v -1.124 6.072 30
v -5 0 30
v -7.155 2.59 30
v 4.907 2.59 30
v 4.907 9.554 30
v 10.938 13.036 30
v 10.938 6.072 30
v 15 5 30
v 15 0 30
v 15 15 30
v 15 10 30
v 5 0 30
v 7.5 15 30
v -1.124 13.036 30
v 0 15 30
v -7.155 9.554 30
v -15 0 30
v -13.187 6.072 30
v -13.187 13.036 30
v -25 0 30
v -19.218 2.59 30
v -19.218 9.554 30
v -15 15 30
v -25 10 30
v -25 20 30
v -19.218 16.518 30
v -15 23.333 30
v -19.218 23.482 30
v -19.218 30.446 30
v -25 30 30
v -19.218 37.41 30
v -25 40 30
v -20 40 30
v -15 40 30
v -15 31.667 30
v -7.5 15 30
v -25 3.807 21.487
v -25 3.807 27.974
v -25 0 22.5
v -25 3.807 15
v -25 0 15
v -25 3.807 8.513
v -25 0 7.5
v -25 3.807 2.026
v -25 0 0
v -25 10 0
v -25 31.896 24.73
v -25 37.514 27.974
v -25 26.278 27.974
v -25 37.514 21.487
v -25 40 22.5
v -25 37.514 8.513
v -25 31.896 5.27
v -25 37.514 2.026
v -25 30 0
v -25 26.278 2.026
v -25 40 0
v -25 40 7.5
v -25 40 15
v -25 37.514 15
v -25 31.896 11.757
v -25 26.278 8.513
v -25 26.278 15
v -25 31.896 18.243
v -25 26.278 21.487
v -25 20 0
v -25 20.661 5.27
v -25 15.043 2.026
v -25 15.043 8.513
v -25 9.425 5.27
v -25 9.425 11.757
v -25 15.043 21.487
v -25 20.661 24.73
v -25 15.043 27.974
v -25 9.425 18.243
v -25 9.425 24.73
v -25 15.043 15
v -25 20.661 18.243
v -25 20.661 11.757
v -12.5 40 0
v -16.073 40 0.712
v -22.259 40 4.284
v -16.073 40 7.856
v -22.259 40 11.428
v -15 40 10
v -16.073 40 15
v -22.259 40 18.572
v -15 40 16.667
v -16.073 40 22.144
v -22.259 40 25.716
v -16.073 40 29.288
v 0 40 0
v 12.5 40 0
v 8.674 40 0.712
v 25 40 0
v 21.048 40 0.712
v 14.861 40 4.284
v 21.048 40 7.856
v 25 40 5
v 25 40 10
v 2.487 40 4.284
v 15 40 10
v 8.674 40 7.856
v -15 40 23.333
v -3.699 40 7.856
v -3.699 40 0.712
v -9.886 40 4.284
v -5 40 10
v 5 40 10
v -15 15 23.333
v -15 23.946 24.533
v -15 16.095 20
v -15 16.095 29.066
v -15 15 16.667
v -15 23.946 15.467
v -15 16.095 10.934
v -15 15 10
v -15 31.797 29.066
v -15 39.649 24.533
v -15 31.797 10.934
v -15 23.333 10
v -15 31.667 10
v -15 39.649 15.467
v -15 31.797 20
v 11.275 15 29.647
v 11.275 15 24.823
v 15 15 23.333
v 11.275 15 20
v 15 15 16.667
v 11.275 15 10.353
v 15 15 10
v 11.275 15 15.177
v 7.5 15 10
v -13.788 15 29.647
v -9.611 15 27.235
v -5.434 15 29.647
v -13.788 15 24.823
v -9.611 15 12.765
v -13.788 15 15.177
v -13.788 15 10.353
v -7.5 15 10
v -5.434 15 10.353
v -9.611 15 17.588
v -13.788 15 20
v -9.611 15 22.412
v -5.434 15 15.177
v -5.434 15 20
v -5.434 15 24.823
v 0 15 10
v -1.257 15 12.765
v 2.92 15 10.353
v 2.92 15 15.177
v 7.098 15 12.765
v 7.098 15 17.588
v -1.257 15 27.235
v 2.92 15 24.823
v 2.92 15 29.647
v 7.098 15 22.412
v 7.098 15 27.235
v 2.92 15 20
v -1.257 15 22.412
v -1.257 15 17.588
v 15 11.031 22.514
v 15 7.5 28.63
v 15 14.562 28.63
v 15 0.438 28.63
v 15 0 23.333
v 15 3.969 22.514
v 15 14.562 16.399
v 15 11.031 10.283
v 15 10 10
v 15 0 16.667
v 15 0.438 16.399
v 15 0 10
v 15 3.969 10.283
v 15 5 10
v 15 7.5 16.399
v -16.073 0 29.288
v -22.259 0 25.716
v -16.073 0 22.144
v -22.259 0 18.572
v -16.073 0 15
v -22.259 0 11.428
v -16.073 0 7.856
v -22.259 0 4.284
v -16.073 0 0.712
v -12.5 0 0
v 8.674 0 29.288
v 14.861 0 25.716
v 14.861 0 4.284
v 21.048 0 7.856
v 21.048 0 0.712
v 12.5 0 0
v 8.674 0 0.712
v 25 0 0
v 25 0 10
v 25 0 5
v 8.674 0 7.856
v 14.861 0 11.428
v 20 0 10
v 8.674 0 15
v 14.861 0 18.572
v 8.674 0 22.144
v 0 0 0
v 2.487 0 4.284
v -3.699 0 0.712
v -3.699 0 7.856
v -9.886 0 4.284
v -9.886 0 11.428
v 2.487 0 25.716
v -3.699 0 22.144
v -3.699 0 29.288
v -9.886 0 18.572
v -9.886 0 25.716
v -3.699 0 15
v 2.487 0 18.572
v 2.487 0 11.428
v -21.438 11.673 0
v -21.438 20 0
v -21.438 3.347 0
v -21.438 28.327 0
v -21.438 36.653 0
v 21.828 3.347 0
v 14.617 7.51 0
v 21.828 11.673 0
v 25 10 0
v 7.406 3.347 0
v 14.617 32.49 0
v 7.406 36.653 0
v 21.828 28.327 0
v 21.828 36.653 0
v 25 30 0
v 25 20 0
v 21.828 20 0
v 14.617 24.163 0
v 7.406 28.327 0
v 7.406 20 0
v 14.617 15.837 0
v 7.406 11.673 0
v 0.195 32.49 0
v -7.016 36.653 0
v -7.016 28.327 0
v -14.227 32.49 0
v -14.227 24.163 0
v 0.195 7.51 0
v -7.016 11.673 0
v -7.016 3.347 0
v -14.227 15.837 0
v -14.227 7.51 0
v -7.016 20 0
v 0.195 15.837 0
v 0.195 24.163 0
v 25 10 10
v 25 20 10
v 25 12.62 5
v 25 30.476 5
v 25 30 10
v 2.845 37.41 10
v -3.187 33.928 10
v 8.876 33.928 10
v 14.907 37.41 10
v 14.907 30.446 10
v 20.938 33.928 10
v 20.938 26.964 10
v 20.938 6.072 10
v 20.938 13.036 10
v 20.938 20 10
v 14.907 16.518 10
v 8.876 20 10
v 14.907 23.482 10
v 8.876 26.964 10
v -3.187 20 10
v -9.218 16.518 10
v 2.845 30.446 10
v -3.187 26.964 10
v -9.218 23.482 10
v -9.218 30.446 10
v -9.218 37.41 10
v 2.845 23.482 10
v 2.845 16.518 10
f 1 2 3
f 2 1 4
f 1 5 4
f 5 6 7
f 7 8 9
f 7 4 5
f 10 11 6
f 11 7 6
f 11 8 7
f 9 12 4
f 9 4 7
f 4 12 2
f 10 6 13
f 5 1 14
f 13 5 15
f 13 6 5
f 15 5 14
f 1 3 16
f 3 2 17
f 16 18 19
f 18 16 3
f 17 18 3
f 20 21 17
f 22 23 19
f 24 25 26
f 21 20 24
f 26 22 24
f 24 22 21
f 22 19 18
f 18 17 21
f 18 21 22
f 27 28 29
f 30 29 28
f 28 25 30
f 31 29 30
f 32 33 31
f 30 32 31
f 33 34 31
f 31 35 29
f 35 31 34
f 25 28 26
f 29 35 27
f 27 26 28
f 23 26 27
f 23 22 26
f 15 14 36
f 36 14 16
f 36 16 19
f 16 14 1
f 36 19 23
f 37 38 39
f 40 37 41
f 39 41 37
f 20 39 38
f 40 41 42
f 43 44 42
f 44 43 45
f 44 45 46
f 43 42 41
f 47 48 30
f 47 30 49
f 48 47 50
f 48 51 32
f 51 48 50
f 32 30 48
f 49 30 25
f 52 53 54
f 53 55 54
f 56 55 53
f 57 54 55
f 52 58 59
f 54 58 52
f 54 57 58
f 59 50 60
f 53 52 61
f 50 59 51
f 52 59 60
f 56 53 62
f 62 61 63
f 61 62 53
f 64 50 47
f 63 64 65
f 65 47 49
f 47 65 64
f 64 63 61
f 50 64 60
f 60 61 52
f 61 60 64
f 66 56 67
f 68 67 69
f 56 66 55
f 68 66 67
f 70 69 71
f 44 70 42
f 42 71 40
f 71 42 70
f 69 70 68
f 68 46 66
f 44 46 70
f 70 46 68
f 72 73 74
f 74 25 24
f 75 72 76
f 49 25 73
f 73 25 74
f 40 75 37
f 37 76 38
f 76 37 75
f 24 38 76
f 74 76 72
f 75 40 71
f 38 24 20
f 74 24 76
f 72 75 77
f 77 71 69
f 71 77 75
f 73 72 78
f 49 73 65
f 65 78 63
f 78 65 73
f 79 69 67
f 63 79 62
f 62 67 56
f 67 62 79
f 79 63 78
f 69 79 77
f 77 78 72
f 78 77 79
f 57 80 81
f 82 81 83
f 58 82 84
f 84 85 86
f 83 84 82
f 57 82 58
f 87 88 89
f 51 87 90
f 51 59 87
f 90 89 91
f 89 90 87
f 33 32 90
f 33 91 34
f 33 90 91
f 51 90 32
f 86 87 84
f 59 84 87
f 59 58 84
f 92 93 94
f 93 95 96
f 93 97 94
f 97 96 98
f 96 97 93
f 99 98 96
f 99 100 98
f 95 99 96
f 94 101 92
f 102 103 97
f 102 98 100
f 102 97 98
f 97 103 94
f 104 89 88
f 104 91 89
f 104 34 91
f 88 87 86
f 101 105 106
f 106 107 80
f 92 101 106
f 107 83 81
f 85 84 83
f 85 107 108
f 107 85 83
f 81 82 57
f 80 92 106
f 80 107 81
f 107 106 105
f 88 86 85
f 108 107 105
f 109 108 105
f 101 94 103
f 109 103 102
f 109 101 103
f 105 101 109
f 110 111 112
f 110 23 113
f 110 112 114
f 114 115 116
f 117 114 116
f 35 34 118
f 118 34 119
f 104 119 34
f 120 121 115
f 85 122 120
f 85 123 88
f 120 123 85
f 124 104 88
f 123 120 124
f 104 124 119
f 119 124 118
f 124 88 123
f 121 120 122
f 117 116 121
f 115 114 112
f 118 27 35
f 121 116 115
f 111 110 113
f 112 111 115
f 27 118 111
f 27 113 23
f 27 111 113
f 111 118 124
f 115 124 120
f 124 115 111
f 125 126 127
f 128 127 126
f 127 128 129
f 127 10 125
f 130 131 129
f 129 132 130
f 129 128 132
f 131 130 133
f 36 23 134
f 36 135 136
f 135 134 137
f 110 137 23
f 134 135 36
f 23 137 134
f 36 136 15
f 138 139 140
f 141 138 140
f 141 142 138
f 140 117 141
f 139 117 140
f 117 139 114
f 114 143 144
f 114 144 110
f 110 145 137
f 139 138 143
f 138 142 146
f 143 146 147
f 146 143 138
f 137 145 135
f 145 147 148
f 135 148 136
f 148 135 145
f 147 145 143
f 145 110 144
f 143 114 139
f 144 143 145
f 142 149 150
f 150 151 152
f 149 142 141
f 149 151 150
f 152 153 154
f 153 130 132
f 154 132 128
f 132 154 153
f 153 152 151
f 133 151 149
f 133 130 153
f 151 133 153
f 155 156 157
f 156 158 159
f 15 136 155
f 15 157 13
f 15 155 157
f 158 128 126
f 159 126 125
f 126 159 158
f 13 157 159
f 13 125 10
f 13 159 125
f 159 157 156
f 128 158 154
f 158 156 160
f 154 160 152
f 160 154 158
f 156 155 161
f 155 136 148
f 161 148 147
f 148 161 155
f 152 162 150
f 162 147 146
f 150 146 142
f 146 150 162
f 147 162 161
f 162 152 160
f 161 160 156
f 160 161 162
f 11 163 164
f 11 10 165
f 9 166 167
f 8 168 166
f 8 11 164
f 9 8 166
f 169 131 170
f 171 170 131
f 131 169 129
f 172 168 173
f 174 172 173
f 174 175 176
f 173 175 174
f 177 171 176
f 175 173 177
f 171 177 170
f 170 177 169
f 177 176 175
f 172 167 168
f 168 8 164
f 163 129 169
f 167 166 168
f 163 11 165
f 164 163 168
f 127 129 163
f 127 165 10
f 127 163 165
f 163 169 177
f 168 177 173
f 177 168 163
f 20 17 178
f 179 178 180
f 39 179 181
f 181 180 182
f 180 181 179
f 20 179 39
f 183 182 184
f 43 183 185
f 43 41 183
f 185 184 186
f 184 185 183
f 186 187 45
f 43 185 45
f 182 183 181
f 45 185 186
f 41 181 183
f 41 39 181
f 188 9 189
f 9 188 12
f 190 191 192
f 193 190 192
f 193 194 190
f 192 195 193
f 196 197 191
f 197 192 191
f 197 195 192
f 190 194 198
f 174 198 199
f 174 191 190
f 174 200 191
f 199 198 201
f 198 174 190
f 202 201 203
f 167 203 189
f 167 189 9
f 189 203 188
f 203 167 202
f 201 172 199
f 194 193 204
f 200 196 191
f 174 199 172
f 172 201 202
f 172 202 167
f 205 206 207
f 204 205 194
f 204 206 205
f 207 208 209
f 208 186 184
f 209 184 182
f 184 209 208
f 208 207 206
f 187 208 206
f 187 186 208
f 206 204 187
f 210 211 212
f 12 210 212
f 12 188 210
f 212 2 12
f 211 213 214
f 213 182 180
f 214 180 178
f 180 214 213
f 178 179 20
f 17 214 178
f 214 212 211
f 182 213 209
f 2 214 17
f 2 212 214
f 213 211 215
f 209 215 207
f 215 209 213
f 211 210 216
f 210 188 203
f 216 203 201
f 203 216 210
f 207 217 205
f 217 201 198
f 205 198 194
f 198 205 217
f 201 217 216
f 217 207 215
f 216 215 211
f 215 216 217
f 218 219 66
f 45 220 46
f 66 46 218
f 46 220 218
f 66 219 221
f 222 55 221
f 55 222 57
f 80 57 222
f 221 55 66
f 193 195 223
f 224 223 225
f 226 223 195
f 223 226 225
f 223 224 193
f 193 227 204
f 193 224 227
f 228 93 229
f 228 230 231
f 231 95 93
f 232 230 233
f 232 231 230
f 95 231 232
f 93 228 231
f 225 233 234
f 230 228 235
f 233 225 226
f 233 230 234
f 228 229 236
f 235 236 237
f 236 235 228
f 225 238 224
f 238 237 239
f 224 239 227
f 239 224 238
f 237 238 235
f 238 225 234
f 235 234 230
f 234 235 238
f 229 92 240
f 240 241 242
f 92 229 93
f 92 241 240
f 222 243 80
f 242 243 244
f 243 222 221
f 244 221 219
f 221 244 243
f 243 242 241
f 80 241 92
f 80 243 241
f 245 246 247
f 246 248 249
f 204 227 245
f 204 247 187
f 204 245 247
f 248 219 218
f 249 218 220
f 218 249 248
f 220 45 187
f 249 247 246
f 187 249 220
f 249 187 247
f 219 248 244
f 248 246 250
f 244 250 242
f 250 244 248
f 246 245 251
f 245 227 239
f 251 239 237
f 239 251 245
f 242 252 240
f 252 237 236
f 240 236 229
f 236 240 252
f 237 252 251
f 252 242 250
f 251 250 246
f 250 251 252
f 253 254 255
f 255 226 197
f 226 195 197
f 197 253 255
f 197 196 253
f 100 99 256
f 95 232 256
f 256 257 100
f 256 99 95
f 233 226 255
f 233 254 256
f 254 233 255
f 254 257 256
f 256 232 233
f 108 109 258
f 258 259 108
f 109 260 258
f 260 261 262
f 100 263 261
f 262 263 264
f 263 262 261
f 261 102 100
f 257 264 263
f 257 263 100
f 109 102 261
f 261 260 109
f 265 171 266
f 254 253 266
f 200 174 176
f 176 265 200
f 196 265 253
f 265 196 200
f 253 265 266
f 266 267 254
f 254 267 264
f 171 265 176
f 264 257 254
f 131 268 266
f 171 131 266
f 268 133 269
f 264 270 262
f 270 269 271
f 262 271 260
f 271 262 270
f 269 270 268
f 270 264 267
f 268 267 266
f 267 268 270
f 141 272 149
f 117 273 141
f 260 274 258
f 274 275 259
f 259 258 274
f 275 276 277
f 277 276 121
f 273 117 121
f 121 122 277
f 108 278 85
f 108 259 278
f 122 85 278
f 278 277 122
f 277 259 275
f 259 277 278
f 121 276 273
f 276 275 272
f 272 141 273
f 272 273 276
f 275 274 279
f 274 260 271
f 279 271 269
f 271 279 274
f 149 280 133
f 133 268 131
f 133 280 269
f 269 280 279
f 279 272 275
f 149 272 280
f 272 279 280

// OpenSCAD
// CSG file generated from FreeCAD 0.20.2
group() {
 group(){
polyhedron ( points = [[-25.000000,0.000000,30.000000],[-25.000000,40.000000,30.000000],[-15.000000,40.000000,30.000000],[-15.000000,15.000000,30.000000],[15.000000,15.000000,30.000000],[15.000000,0.000000,30.000000],[-25.000000,40.000000,-0.000000],[-25.000000,0.000000,-0.000000],[25.000000,40.000000,-0.000000],[25.000000,40.000000,10.000000],[-15.000000,40.000000,10.000000],[-15.000000,15.000000,10.000000],[15.000000,15.000000,10.000000],[15.000000,0.000000,10.000000],[25.000000,-0.000000,10.000000],[25.000000,-0.000000,0.000000],[-25.000000,10.000000,30.000000],[-25.000000,20.000000,30.000000],[-25.000000,30.000000,30.000000],[-20.000000,40.000000,30.000000],[-15.000000,23.333334,30.000000],[-15.000000,31.666666,30.000000],[7.500000,15.000000,30.000000],[-0.000000,15.000000,30.000000],[-7.500000,15.000000,30.000000],[15.000000,5.000000,30.000000],[15.000000,10.000000,30.000000],[-15.000000,0.000000,30.000000],[-5.000000,-0.000000,30.000000],[5.000000,-0.000000,30.000000],[-25.000000,40.000000,22.500000],[-25.000000,40.000000,15.000000],[-25.000000,40.000000,7.500000],[-25.000000,30.000000,0.000000],[-25.000000,20.000000,0.000000],[-25.000000,10.000000,0.000000],[-25.000000,-0.000000,7.500000],[-25.000000,-0.000000,15.000000],[-25.000000,-0.000000,22.500000],[-12.500000,40.000000,-0.000000],[-0.000000,40.000000,-0.000000],[12.500000,40.000000,-0.000000],[25.000000,40.000000,5.000000],[15.000000,40.000000,10.000000],[5.000000,40.000000,10.000000],[-5.000000,40.000000,10.000000],[-15.000000,40.000000,23.333334],[-15.000000,40.000000,16.666666],[-15.000000,31.666666,10.000000],[-15.000000,23.333334,10.000000],[-15.000000,15.000000,16.666666],[-15.000000,15.000000,23.333334],[15.000000,15.000000,23.333334],[15.000000,15.000000,16.666666],[7.500000,15.000000,10.000000],[0.000000,15.000000,10.000000],[-7.500000,15.000000,10.000000],[15.000000,10.000000,10.000000],[15.000000,5.000000,10.000000],[15.000000,0.000000,16.666666],[15.000000,-0.000000,23.333334],[20.000000,-0.000000,10.000000],[25.000000,0.000000,5.000000],[-12.500000,0.000000,-0.000000],[-0.000000,-0.000000,0.000000],[12.500000,-0.000000,0.000000],[25.000000,30.000000,-0.000000],[25.000000,20.000000,-0.000000],[25.000000,10.000000,-0.000000],[25.000000,30.000000,10.000000],[25.000000,20.000000,10.000000],[25.000000,10.000000,10.000000],[-1.124356,6.071796,30.000000],[10.937822,13.035898,30.000000],[-13.186534,13.035898,30.000000],[-7.155445,2.589746,30.000000],[4.906733,9.553847,30.000000],[4.906733,2.589746,30.000000],[10.937822,6.071796,30.000000],[-1.124356,13.035898,30.000000],[-7.155445,9.553847,30.000000],[-13.186534,6.071796,30.000000],[-19.217623,2.589746,30.000000],[-19.217623,9.553847,30.000000],[-19.217623,16.517950,30.000000],[-19.217623,23.482052,30.000000],[-19.217623,30.446154,30.000000],[-19.217623,37.410255,30.000000],[-25.000000,3.806898,15.000000],[-25.000000,26.278448,2.026044],[-25.000000,26.278448,27.973957],[-25.000000,3.806898,27.973957],[-25.000000,3.806898,2.026044],[-25.000000,37.514225,21.486979],[-25.000000,37.514225,8.513022],[-25.000000,26.278448,15.000000],[-25.000000,15.042673,8.513022],[-25.000000,15.042673,21.486979],[-25.000000,3.806898,21.486979],[-25.000000,3.806898,8.513022],[-25.000000,31.896338,24.730467],[-25.000000,37.514225,27.973957],[-25.000000,31.896338,5.269533],[-25.000000,37.514225,2.026044],[-25.000000,37.514225,15.000000],[-25.000000,31.896338,11.756511],[-25.000000,26.278448,8.513022],[-25.000000,31.896338,18.243488],[-25.000000,26.278448,21.486979],[-25.000000,20.660561,5.269533],[-25.000000,15.042673,2.026044],[-25.000000,9.424786,5.269533],[-25.000000,9.424786,11.756511],[-25.000000,20.660561,24.730467],[-25.000000,15.042673,27.973957],[-25.000000,9.424786,18.243488],[-25.000000,9.424786,24.730467],[-25.000000,15.042673,15.000000],[-25.000000,20.660561,18.243488],[-25.000000,20.660561,11.756511],[-16.072701,40.000000,15.000000],[8.674176,40.000000,0.712384],[-16.072701,40.000000,0.712384],[-16.072701,40.000000,29.287615],[21.047615,40.000000,7.856192],[-3.699262,40.000000,7.856192],[-22.259418,40.000000,4.284288],[-22.259418,40.000000,11.428096],[-16.072701,40.000000,7.856192],[-22.259418,40.000000,18.571903],[-22.259418,40.000000,25.715712],[-16.072701,40.000000,22.143808],[14.860895,40.000000,4.284288],[21.047615,40.000000,0.712384],[8.674176,40.000000,7.856192],[2.487457,40.000000,4.284288],[-3.699262,40.000000,0.712384],[-9.885982,40.000000,4.284288],[-15.000000,31.797277,10.934029],[-15.000000,31.797277,29.065971],[-15.000000,16.094553,20.000000],[-15.000000,16.094553,29.065971],[-15.000000,16.094553,10.934029],[-15.000000,39.648640,24.532986],[-15.000000,39.648640,15.467014],[-15.000000,31.797277,20.000000],[-15.000000,23.945915,15.467014],[-15.000000,23.945915,24.532986],[-5.434068,15.000000,10.353176],[-5.434068,15.000000,29.646824],[11.274721,15.000000,20.000000],[11.274721,15.000000,29.646824],[11.274721,15.000000,10.353176],[-13.788463,15.000000,24.823412],[-13.788463,15.000000,15.176588],[-5.434068,15.000000,20.000000],[2.920326,15.000000,15.176588],[2.920326,15.000000,24.823412],[11.274721,15.000000,24.823412],[11.274721,15.000000,15.176588],[-9.611265,15.000000,27.235117],[-13.788463,15.000000,29.646824],[-9.611265,15.000000,12.764882],[-13.788463,15.000000,10.353176],[-13.788463,15.000000,20.000000],[-9.611265,15.000000,17.588293],[-5.434068,15.000000,15.176588],[-9.611265,15.000000,22.411705],[-5.434068,15.000000,24.823412],[-1.256871,15.000000,12.764882],[2.920326,15.000000,10.353176],[7.097524,15.000000,12.764882],[7.097524,15.000000,17.588295],[-1.256871,15.000000,27.235117],[2.920326,15.000000,29.646824],[7.097524,15.000000,22.411705],[7.097524,15.000000,27.235119],[2.920326,15.000000,20.000000],[-1.256871,15.000000,22.411705],[-1.256871,15.000000,17.588293],[15.000000,0.437946,16.398502],[15.000000,14.562054,16.398502],[15.000000,7.500000,28.630339],[15.000000,14.562054,28.630339],[15.000000,0.437946,28.630339],[15.000000,11.031027,10.282584],[15.000000,3.968973,10.282584],[15.000000,7.500000,16.398502],[15.000000,3.968973,22.514420],[15.000000,11.031027,22.514420],[8.674176,0.000000,0.712384],[8.674176,0.000000,29.287617],[-16.072701,0.000000,15.000000],[-16.072701,0.000000,29.287617],[-16.072701,0.000000,0.712384],[21.047615,0.000000,7.856192],[8.674176,0.000000,15.000000],[-3.699262,0.000000,7.856192],[-3.699262,0.000000,22.143808],[-22.259418,0.000000,25.715712],[-22.259418,0.000000,18.571903],[-16.072701,0.000000,22.143808],[-22.259418,0.000000,11.428096],[-22.259418,0.000000,4.284288],[-16.072701,0.000000,7.856192],[14.860895,0.000000,25.715712],[14.860895,0.000000,4.284288],[21.047615,0.000000,0.712384],[14.860895,0.000000,11.428096],[8.674176,0.000000,7.856192],[14.860895,0.000000,18.571903],[8.674176,0.000000,22.143808],[2.487457,0.000000,4.284288],[-3.699262,0.000000,0.712384],[-9.885982,0.000000,4.284288],[-9.885982,0.000000,11.428096],[2.487457,0.000000,25.715712],[-3.699262,0.000000,29.287617],[-9.885982,0.000000,18.571903],[-9.885982,0.000000,25.715712],[-3.699262,0.000000,15.000000],[2.487457,0.000000,18.571903],[2.487457,0.000000,11.428096],[7.405854,36.653175,-0.000000],[7.405854,3.346825,-0.000000],[-21.438292,20.000000,-0.000000],[-21.438292,3.346825,-0.000000],[-21.438292,36.653175,-0.000000],[21.827927,11.673412,0.000000],[21.827927,28.326588,0.000000],[7.405854,20.000000,-0.000000],[-7.016219,28.326588,-0.000000],[-7.016219,11.673412,-0.000000],[-21.438292,11.673412,-0.000000],[-21.438292,28.326588,-0.000000],[14.616891,7.510118,0.000000],[21.827927,3.346825,0.000000],[14.616891,32.489883,-0.000000],[21.827927,36.653175,0.000000],[21.827927,20.000000,0.000000],[14.616891,24.163294,-0.000000],[7.405854,28.326588,-0.000000],[14.616891,15.836706,0.000000],[7.405854,11.673412,-0.000000],[0.194818,32.489883,-0.000000],[-7.016219,36.653175,-0.000000],[-14.227255,32.489883,-0.000000],[-14.227255,24.163294,-0.000000],[0.194818,7.510118,-0.000000],[-7.016219,3.346825,-0.000000],[-14.227255,15.836706,-0.000000],[-14.227255,7.510118,-0.000000],[-7.016219,20.000000,-0.000000],[0.194818,15.836706,-0.000000],[0.194818,24.163294,-0.000000],[25.000000,12.619660,5.000000],[25.000000,30.476496,5.000000],[8.875644,33.928204,10.000000],[20.937822,26.964102,10.000000],[20.937822,13.035898,10.000000],[8.875644,20.000000,10.000000],[-3.186534,26.964102,10.000000],[2.844555,37.410255,10.000000],[14.906733,37.410255,10.000000],[14.906733,30.446154,10.000000],[20.937822,33.928204,10.000000],[20.937822,6.071796,10.000000],[20.937822,20.000000,10.000000],[14.906733,16.517950,10.000000],[14.906733,23.482052,10.000000],[8.875644,26.964102,10.000000],[-9.217624,16.517950,10.000000],[2.844555,30.446154,10.000000],[-3.186534,33.928204,10.000000],[-9.217624,23.482052,10.000000],[-9.217624,30.446154,10.000000],[-9.217624,37.410255,10.000000],[-3.186534,20.000000,10.000000],[2.844555,23.482052,10.000000],[2.844555,16.517950,10.000000]], faces = [[75,28,72],[77,72,28],[77,76,72],[78,73,76],[5,25,78],[76,77,78],[73,26,4],[73,78,26],[78,25,26],[77,29,5],[78,77,5],[28,29,77],[22,73,4],[79,72,76],[23,76,22],[76,73,22],[79,76,23],[80,75,72],[27,28,75],[74,81,80],[75,80,81],[75,81,27],[27,82,0],[74,3,83],[84,17,16],[16,0,82],[16,83,84],[82,83,16],[81,74,83],[82,27,81],[83,82,81],[86,85,20],[85,86,18],[18,17,85],[18,86,87],[87,19,1],[87,1,18],[87,2,19],[86,21,87],[2,87,21],[84,85,17],[20,21,86],[85,84,20],[20,84,3],[84,83,3],[24,79,23],[80,79,24],[74,80,24],[72,79,80],[3,74,24],[38,91,98],[37,98,88],[98,37,38],[91,38,0],[99,37,88],[99,92,36],[7,36,92],[35,7,92],[37,99,36],[18,101,100],[90,18,100],[93,100,101],[1,30,101],[93,101,30],[101,18,1],[17,18,90],[103,102,94],[103,33,102],[102,33,89],[33,103,6],[31,32,94],[94,32,103],[32,6,103],[104,93,31],[105,94,102],[30,31,93],[104,31,94],[106,102,89],[95,105,106],[102,106,105],[100,93,107],[108,107,95],[90,100,108],[107,108,100],[105,95,107],[104,107,93],[94,105,104],[107,104,105],[109,89,34],[96,109,110],[33,34,89],[109,34,110],[112,96,111],[99,111,92],[88,112,99],[111,99,112],[110,111,96],[34,35,110],[111,35,92],[110,35,111],[114,113,97],[16,17,114],[116,97,115],[113,17,90],[114,17,113],[98,115,88],[91,116,98],[115,98,116],[116,91,16],[97,116,114],[112,88,115],[0,16,91],[116,16,114],[117,115,97],[96,112,117],[115,117,112],[118,97,113],[108,113,90],[95,118,108],[113,108,118],[109,96,119],[106,119,95],[89,109,106],[119,106,109],[118,95,119],[117,119,96],[97,118,117],[119,117,118],[122,39,6],[128,122,126],[127,126,32],[120,10,127],[126,127,128],[32,126,6],[131,47,129],[130,129,30],[129,31,30],[123,131,130],[129,130,131],[130,1,19],[2,123,19],[123,130,19],[1,130,30],[127,129,120],[129,127,31],[127,32,31],[121,41,40],[133,8,41],[121,132,41],[124,133,132],[41,132,133],[133,124,42],[124,9,42],[133,42,8],[40,135,121],[132,134,43],[9,124,43],[124,132,43],[121,134,132],[47,131,46],[131,123,46],[123,2,46],[120,129,47],[136,125,135],[39,137,136],[136,135,40],[122,128,137],[128,127,10],[45,137,10],[128,10,137],[6,126,122],[136,40,39],[122,137,39],[125,136,137],[10,120,47],[125,137,45],[125,45,44],[134,121,135],[43,134,44],[134,135,44],[44,135,125],[140,147,51],[141,3,51],[50,140,51],[142,146,50],[142,50,11],[139,2,21],[143,2,139],[2,143,46],[146,49,138],[138,48,10],[47,144,10],[10,144,138],[47,46,145],[145,138,144],[143,145,46],[139,145,143],[144,47,145],[48,138,49],[49,142,11],[140,50,146],[21,20,139],[146,142,49],[141,51,147],[146,147,140],[147,139,20],[3,141,20],[141,147,20],[145,139,147],[138,145,146],[147,146,145],[52,158,151],[158,52,150],[53,150,52],[151,4,52],[53,12,152],[152,159,53],[159,150,53],[54,152,12],[161,3,24],[149,160,24],[153,161,160],[3,153,51],[24,160,161],[161,153,3],[23,149,24],[163,154,162],[163,162,56],[162,148,56],[56,11,163],[163,11,154],[50,154,11],[164,165,50],[51,164,50],[153,167,51],[165,162,154],[166,148,162],[155,166,165],[162,165,166],[160,167,153],[168,155,167],[149,168,160],[167,160,168],[165,167,155],[164,51,167],[154,50,165],[167,165,164],[169,55,148],[156,170,169],[56,148,55],[169,170,55],[172,171,156],[159,152,171],[150,159,172],[171,172,159],[170,156,171],[55,170,54],[171,152,54],[171,54,170],[174,157,173],[176,175,157],[173,149,23],[22,174,23],[174,173,23],[158,150,175],[151,158,176],[175,176,158],[176,174,22],[4,151,22],[151,176,22],[157,174,176],[172,175,150],[177,157,175],[156,177,172],[175,172,177],[178,173,157],[168,149,173],[155,168,178],[173,178,168],[169,179,156],[166,155,179],[148,166,169],[179,169,166],[178,179,155],[177,156,179],[157,177,178],[179,178,177],[182,189,26],[183,4,26],[60,184,5],[184,188,25],[182,26,25],[184,25,5],[185,12,181],[12,185,57],[53,181,12],[180,188,59],[180,59,13],[58,186,13],[13,186,180],[58,57,187],[187,180,186],[185,187,57],[181,187,185],[186,58,187],[188,60,59],[182,25,188],[181,53,189],[188,184,60],[183,26,189],[188,189,182],[189,53,52],[4,183,52],[183,189,52],[187,181,189],[180,187,188],[189,188,187],[193,27,0],[201,193,199],[200,199,38],[192,201,200],[199,200,201],[38,199,0],[204,192,202],[203,202,36],[202,37,36],[194,204,203],[202,203,204],[7,63,194],[7,203,36],[200,202,192],[194,203,7],[202,200,37],[200,38,37],[205,5,191],[29,191,5],[207,195,206],[207,206,65],[206,190,65],[65,15,207],[195,62,14],[195,207,62],[207,15,62],[209,190,206],[208,209,13],[206,195,13],[195,61,13],[196,209,208],[206,13,209],[211,196,210],[205,211,60],[5,205,60],[191,211,205],[210,60,211],[208,59,196],[64,65,190],[195,14,61],[59,208,13],[210,196,59],[60,210,59],[197,213,212],[190,212,64],[212,213,64],[215,214,197],[204,194,214],[192,204,215],[214,215,204],[213,197,214],[213,214,63],[214,194,63],[63,64,213],[217,198,216],[217,216,29],[216,191,29],[29,28,217],[219,218,198],[201,192,218],[193,201,219],[218,219,201],[0,199,193],[193,219,27],[198,217,219],[215,218,192],[27,219,28],[219,217,28],[220,198,218],[197,220,215],[218,215,220],[221,216,198],[211,191,216],[196,211,221],[216,221,211],[212,222,197],[209,196,222],[190,209,212],[222,212,209],[221,222,196],[220,197,222],[198,220,221],[222,221,220],[34,225,233],[35,226,7],[233,35,34],[233,226,35],[234,225,34],[234,33,227],[6,227,33],[227,6,39],[34,33,234],[236,15,65],[228,236,235],[15,236,68],[228,68,236],[65,235,236],[64,224,65],[224,235,65],[223,41,237],[238,229,237],[41,8,238],[67,229,66],[229,238,66],[66,238,8],[238,237,41],[239,67,228],[240,237,229],[68,228,67],[239,229,67],[241,223,237],[230,241,240],[237,240,241],[235,242,228],[243,230,242],[224,243,235],[242,235,243],[240,242,230],[239,228,242],[229,239,240],[242,240,239],[244,40,223],[231,245,244],[41,223,40],[244,245,40],[39,246,227],[247,246,231],[234,227,246],[225,234,247],[246,247,234],[245,231,246],[40,245,39],[245,246,39],[249,232,248],[251,250,232],[248,224,64],[63,249,64],[249,248,64],[233,225,250],[226,233,251],[250,251,233],[63,7,226],[232,249,251],[226,251,63],[249,63,251],[247,250,225],[252,232,250],[231,252,247],[250,247,252],[253,248,232],[243,224,248],[230,243,253],[248,253,243],[244,254,231],[241,230,254],[223,241,244],[254,244,241],[253,254,230],[252,231,254],[232,252,253],[254,253,252],[255,70,71],[62,68,255],[62,15,68],[255,71,62],[71,14,62],[256,42,9],[256,66,8],[9,69,256],[8,42,256],[255,68,67],[256,70,67],[255,67,70],[256,69,70],[67,66,256],[262,44,45],[45,273,262],[262,257,44],[264,263,257],[263,265,9],[258,265,264],[263,264,265],[9,43,263],[265,258,69],[9,265,69],[263,43,44],[44,257,263],[259,57,266],[259,71,70],[58,13,61],[61,266,58],[71,266,14],[61,14,266],[259,266,71],[70,267,259],[258,267,70],[58,266,57],[70,69,258],[259,268,12],[259,12,57],[260,54,268],[264,269,258],[270,260,269],[257,270,264],[269,264,270],[268,269,260],[267,258,269],[259,267,268],[269,268,267],[55,277,56],[56,271,11],[262,272,257],[273,261,272],[272,262,273],[275,274,261],[49,274,275],[49,11,271],[275,48,49],[10,276,45],[276,273,45],[276,10,48],[48,275,276],[261,273,275],[276,275,273],[271,274,49],[277,261,274],[271,56,277],[274,271,277],[278,272,261],[270,257,272],[260,270,278],[272,278,270],[54,279,55],[12,268,54],[260,279,54],[278,279,260],[261,277,278],[279,277,55],[279,278,277]]);
}
}
